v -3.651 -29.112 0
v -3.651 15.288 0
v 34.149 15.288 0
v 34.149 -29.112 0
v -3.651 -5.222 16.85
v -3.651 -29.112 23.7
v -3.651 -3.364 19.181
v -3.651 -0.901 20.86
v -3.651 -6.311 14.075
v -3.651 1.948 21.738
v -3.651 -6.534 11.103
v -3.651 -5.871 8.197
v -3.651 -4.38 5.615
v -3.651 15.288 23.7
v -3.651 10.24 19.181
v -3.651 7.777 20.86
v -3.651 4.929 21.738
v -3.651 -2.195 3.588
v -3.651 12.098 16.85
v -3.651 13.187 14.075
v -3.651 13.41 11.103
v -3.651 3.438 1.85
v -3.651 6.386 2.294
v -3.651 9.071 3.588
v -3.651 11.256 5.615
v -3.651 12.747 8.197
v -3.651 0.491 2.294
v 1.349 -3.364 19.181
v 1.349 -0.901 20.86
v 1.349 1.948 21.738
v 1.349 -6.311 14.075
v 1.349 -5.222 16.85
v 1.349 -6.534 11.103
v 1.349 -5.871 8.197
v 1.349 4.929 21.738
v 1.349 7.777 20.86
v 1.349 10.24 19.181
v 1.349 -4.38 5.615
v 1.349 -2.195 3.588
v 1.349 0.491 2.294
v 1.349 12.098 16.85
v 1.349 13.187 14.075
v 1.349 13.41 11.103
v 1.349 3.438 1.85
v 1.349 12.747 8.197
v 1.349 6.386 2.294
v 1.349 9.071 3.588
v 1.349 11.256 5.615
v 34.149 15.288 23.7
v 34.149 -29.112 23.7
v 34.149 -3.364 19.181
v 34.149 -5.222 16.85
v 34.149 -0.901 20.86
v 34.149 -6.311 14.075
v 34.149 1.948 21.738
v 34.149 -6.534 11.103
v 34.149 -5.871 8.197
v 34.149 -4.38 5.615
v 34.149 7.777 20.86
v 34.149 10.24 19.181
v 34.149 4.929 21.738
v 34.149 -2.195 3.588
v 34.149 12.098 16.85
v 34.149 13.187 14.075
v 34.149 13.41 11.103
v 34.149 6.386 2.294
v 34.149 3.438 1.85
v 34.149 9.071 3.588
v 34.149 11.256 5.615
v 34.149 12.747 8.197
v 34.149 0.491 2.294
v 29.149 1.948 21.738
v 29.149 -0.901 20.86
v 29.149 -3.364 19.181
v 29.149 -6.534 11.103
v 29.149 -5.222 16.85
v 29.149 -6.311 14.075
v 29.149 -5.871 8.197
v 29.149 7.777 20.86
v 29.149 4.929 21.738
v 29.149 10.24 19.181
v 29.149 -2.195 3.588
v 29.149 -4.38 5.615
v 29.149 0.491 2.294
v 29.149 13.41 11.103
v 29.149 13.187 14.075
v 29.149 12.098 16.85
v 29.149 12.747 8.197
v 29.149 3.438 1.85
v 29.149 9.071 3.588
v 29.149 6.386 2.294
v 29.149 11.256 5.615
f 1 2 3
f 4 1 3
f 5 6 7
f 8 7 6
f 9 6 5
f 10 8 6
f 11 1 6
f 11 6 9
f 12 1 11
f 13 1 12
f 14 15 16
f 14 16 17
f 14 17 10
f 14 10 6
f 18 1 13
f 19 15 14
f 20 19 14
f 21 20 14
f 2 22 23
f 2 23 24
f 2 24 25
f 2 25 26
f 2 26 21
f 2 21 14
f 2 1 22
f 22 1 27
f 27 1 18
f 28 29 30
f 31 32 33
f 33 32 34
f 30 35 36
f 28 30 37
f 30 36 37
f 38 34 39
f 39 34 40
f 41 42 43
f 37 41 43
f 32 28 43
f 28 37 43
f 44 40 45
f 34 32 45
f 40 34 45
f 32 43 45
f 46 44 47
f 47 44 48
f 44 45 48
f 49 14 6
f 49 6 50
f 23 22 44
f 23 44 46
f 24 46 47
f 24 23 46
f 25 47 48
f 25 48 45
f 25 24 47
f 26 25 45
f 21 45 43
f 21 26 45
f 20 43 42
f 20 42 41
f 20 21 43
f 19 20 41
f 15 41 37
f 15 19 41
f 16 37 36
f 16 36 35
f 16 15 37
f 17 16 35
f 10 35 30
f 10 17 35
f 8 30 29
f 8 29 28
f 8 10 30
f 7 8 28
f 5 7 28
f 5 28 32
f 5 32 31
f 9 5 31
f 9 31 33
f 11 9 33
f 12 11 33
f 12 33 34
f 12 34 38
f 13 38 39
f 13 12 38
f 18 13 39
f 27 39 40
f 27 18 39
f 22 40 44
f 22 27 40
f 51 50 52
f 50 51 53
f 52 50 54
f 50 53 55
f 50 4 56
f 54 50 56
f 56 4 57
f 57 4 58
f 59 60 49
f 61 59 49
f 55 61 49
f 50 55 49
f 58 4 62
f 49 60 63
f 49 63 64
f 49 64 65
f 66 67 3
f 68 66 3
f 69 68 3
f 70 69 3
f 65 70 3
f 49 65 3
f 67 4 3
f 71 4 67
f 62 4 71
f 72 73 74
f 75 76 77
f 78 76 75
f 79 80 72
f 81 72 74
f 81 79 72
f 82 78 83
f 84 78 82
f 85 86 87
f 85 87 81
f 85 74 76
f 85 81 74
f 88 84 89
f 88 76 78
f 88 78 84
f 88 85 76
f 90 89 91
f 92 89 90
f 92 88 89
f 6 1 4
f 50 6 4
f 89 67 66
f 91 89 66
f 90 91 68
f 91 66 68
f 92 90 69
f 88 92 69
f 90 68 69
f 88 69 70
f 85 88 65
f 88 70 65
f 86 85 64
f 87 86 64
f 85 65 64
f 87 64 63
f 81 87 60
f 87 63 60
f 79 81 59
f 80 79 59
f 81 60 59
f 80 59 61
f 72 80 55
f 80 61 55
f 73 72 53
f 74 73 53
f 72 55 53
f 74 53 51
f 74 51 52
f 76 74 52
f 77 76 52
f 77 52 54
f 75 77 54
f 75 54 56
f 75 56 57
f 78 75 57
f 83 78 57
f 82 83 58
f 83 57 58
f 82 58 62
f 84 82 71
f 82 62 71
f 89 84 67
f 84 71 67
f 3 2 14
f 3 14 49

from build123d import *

# Parameters (mm, degrees)
SKETCH1_W           = 37.8
SKETCH1_H           = 44.4
BOSS_EXTRUDE1_DEPTH = 23.7
SKETCH2_R           = 10
CUT_EXTRUDE1_DEPTH  = 5


with BuildPart() as part:
    # Sketch1 → Boss-Extrude1 (new body)
    with BuildSketch(Plane.XY):
        with Locations((15.249090909, -6.911818182)):
            Rectangle(SKETCH1_W, SKETCH1_H)
    extrude(amount=BOSS_EXTRUDE1_DEPTH)

    # Sketch2 → Cut-Extrude1 (cut)
    with BuildSketch(Plane(origin=(34.149090909, 0, 0), x_dir=(0, 0, -1), z_dir=(1, 0, 0))):
        with Locations((-11.85, 3.438181818)):
            Circle(SKETCH2_R)
    cut_extrude1 = extrude(amount=-CUT_EXTRUDE1_DEPTH, mode=Mode.SUBTRACT)

    # Mirror1: Cut-Extrude1 across plane
    add(cut_extrude1.mirror(Plane(origin=(15.249090909, 0, 0), x_dir=(0, 0, 1), z_dir=(1, 0, 0))), mode=Mode.SUBTRACT)


solid = part.part
